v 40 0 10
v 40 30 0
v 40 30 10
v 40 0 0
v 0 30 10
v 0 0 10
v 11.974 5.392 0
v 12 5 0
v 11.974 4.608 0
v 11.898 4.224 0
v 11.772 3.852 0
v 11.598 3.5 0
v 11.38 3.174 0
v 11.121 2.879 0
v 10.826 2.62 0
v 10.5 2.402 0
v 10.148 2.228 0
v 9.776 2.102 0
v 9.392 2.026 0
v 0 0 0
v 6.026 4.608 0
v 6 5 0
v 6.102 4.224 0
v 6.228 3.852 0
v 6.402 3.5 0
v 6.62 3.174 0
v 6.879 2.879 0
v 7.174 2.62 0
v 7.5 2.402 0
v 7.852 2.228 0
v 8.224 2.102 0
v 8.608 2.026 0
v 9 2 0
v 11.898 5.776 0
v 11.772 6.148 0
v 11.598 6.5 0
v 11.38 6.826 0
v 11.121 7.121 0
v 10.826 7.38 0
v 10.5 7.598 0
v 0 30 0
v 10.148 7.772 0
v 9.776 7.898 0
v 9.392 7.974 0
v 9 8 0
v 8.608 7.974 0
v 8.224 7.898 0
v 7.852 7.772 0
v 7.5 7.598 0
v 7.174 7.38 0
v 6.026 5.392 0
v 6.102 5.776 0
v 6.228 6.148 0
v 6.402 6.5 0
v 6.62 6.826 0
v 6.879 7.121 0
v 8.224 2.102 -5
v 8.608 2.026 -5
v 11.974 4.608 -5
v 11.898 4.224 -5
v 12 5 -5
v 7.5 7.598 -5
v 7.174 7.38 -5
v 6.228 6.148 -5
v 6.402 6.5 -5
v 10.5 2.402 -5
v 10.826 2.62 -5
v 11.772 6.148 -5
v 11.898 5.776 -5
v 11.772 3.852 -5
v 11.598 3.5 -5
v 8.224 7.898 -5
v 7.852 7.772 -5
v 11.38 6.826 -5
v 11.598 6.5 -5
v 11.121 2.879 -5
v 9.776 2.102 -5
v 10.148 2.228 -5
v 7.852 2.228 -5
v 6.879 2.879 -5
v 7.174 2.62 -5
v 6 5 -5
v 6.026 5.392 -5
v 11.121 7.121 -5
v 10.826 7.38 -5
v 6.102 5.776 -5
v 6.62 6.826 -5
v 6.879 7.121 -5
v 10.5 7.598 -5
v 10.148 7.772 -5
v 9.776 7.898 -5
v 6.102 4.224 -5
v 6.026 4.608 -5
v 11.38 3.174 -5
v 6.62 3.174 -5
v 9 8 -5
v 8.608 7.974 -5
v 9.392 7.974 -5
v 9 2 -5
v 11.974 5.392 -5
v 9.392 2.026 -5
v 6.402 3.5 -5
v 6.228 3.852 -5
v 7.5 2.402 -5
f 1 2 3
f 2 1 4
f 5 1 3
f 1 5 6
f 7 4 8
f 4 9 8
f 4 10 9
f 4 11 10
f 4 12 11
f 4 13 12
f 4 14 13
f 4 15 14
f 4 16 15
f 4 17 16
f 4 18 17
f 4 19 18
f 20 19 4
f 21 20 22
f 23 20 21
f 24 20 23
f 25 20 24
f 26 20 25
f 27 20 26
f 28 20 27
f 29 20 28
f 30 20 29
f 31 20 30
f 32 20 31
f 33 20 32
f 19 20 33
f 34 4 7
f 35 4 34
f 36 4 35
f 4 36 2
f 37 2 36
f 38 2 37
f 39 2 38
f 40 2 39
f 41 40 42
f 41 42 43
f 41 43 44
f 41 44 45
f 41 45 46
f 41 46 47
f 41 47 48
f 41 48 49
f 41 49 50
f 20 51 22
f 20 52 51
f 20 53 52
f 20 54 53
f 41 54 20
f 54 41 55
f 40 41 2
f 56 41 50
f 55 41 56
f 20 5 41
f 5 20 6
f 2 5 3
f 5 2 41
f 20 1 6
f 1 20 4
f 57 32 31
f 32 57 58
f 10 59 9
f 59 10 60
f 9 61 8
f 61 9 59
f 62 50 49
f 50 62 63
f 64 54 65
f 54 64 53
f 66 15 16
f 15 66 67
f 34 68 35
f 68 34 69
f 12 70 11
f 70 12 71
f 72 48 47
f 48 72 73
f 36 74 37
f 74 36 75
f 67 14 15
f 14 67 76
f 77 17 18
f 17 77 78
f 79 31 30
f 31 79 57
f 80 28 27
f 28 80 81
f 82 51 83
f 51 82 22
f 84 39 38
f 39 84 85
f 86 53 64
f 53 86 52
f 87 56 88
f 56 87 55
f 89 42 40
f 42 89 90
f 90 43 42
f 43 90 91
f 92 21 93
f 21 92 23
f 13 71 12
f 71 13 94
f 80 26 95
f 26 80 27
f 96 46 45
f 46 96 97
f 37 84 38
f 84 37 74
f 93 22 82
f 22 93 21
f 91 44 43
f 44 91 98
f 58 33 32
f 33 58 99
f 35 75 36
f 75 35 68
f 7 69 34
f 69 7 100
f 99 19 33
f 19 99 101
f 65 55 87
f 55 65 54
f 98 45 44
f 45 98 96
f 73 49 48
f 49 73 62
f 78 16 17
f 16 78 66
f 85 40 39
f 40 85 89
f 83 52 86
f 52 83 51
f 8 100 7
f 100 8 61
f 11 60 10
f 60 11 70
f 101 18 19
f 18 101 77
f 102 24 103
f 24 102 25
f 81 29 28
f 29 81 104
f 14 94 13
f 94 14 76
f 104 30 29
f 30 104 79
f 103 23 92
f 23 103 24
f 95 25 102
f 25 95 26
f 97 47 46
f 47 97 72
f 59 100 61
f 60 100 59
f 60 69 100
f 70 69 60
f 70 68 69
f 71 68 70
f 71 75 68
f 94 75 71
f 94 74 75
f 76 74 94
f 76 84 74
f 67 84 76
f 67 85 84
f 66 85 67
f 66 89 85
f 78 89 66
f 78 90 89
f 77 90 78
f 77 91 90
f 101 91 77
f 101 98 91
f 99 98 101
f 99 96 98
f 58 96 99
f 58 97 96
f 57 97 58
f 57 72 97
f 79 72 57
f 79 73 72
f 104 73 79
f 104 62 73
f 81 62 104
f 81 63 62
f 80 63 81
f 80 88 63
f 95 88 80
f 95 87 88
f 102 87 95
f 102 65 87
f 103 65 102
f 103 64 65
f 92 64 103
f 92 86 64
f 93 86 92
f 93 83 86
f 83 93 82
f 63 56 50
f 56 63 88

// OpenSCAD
// units=mm — generated by scad_emitter.py
// part=unnamed
$fn = 48;

union() { cube([40, 30, 10]); translate([9, 5, 0.5]) rotate([180, 0, 0]) cylinder(h=5.5, r=3, $fn=$fn); }
